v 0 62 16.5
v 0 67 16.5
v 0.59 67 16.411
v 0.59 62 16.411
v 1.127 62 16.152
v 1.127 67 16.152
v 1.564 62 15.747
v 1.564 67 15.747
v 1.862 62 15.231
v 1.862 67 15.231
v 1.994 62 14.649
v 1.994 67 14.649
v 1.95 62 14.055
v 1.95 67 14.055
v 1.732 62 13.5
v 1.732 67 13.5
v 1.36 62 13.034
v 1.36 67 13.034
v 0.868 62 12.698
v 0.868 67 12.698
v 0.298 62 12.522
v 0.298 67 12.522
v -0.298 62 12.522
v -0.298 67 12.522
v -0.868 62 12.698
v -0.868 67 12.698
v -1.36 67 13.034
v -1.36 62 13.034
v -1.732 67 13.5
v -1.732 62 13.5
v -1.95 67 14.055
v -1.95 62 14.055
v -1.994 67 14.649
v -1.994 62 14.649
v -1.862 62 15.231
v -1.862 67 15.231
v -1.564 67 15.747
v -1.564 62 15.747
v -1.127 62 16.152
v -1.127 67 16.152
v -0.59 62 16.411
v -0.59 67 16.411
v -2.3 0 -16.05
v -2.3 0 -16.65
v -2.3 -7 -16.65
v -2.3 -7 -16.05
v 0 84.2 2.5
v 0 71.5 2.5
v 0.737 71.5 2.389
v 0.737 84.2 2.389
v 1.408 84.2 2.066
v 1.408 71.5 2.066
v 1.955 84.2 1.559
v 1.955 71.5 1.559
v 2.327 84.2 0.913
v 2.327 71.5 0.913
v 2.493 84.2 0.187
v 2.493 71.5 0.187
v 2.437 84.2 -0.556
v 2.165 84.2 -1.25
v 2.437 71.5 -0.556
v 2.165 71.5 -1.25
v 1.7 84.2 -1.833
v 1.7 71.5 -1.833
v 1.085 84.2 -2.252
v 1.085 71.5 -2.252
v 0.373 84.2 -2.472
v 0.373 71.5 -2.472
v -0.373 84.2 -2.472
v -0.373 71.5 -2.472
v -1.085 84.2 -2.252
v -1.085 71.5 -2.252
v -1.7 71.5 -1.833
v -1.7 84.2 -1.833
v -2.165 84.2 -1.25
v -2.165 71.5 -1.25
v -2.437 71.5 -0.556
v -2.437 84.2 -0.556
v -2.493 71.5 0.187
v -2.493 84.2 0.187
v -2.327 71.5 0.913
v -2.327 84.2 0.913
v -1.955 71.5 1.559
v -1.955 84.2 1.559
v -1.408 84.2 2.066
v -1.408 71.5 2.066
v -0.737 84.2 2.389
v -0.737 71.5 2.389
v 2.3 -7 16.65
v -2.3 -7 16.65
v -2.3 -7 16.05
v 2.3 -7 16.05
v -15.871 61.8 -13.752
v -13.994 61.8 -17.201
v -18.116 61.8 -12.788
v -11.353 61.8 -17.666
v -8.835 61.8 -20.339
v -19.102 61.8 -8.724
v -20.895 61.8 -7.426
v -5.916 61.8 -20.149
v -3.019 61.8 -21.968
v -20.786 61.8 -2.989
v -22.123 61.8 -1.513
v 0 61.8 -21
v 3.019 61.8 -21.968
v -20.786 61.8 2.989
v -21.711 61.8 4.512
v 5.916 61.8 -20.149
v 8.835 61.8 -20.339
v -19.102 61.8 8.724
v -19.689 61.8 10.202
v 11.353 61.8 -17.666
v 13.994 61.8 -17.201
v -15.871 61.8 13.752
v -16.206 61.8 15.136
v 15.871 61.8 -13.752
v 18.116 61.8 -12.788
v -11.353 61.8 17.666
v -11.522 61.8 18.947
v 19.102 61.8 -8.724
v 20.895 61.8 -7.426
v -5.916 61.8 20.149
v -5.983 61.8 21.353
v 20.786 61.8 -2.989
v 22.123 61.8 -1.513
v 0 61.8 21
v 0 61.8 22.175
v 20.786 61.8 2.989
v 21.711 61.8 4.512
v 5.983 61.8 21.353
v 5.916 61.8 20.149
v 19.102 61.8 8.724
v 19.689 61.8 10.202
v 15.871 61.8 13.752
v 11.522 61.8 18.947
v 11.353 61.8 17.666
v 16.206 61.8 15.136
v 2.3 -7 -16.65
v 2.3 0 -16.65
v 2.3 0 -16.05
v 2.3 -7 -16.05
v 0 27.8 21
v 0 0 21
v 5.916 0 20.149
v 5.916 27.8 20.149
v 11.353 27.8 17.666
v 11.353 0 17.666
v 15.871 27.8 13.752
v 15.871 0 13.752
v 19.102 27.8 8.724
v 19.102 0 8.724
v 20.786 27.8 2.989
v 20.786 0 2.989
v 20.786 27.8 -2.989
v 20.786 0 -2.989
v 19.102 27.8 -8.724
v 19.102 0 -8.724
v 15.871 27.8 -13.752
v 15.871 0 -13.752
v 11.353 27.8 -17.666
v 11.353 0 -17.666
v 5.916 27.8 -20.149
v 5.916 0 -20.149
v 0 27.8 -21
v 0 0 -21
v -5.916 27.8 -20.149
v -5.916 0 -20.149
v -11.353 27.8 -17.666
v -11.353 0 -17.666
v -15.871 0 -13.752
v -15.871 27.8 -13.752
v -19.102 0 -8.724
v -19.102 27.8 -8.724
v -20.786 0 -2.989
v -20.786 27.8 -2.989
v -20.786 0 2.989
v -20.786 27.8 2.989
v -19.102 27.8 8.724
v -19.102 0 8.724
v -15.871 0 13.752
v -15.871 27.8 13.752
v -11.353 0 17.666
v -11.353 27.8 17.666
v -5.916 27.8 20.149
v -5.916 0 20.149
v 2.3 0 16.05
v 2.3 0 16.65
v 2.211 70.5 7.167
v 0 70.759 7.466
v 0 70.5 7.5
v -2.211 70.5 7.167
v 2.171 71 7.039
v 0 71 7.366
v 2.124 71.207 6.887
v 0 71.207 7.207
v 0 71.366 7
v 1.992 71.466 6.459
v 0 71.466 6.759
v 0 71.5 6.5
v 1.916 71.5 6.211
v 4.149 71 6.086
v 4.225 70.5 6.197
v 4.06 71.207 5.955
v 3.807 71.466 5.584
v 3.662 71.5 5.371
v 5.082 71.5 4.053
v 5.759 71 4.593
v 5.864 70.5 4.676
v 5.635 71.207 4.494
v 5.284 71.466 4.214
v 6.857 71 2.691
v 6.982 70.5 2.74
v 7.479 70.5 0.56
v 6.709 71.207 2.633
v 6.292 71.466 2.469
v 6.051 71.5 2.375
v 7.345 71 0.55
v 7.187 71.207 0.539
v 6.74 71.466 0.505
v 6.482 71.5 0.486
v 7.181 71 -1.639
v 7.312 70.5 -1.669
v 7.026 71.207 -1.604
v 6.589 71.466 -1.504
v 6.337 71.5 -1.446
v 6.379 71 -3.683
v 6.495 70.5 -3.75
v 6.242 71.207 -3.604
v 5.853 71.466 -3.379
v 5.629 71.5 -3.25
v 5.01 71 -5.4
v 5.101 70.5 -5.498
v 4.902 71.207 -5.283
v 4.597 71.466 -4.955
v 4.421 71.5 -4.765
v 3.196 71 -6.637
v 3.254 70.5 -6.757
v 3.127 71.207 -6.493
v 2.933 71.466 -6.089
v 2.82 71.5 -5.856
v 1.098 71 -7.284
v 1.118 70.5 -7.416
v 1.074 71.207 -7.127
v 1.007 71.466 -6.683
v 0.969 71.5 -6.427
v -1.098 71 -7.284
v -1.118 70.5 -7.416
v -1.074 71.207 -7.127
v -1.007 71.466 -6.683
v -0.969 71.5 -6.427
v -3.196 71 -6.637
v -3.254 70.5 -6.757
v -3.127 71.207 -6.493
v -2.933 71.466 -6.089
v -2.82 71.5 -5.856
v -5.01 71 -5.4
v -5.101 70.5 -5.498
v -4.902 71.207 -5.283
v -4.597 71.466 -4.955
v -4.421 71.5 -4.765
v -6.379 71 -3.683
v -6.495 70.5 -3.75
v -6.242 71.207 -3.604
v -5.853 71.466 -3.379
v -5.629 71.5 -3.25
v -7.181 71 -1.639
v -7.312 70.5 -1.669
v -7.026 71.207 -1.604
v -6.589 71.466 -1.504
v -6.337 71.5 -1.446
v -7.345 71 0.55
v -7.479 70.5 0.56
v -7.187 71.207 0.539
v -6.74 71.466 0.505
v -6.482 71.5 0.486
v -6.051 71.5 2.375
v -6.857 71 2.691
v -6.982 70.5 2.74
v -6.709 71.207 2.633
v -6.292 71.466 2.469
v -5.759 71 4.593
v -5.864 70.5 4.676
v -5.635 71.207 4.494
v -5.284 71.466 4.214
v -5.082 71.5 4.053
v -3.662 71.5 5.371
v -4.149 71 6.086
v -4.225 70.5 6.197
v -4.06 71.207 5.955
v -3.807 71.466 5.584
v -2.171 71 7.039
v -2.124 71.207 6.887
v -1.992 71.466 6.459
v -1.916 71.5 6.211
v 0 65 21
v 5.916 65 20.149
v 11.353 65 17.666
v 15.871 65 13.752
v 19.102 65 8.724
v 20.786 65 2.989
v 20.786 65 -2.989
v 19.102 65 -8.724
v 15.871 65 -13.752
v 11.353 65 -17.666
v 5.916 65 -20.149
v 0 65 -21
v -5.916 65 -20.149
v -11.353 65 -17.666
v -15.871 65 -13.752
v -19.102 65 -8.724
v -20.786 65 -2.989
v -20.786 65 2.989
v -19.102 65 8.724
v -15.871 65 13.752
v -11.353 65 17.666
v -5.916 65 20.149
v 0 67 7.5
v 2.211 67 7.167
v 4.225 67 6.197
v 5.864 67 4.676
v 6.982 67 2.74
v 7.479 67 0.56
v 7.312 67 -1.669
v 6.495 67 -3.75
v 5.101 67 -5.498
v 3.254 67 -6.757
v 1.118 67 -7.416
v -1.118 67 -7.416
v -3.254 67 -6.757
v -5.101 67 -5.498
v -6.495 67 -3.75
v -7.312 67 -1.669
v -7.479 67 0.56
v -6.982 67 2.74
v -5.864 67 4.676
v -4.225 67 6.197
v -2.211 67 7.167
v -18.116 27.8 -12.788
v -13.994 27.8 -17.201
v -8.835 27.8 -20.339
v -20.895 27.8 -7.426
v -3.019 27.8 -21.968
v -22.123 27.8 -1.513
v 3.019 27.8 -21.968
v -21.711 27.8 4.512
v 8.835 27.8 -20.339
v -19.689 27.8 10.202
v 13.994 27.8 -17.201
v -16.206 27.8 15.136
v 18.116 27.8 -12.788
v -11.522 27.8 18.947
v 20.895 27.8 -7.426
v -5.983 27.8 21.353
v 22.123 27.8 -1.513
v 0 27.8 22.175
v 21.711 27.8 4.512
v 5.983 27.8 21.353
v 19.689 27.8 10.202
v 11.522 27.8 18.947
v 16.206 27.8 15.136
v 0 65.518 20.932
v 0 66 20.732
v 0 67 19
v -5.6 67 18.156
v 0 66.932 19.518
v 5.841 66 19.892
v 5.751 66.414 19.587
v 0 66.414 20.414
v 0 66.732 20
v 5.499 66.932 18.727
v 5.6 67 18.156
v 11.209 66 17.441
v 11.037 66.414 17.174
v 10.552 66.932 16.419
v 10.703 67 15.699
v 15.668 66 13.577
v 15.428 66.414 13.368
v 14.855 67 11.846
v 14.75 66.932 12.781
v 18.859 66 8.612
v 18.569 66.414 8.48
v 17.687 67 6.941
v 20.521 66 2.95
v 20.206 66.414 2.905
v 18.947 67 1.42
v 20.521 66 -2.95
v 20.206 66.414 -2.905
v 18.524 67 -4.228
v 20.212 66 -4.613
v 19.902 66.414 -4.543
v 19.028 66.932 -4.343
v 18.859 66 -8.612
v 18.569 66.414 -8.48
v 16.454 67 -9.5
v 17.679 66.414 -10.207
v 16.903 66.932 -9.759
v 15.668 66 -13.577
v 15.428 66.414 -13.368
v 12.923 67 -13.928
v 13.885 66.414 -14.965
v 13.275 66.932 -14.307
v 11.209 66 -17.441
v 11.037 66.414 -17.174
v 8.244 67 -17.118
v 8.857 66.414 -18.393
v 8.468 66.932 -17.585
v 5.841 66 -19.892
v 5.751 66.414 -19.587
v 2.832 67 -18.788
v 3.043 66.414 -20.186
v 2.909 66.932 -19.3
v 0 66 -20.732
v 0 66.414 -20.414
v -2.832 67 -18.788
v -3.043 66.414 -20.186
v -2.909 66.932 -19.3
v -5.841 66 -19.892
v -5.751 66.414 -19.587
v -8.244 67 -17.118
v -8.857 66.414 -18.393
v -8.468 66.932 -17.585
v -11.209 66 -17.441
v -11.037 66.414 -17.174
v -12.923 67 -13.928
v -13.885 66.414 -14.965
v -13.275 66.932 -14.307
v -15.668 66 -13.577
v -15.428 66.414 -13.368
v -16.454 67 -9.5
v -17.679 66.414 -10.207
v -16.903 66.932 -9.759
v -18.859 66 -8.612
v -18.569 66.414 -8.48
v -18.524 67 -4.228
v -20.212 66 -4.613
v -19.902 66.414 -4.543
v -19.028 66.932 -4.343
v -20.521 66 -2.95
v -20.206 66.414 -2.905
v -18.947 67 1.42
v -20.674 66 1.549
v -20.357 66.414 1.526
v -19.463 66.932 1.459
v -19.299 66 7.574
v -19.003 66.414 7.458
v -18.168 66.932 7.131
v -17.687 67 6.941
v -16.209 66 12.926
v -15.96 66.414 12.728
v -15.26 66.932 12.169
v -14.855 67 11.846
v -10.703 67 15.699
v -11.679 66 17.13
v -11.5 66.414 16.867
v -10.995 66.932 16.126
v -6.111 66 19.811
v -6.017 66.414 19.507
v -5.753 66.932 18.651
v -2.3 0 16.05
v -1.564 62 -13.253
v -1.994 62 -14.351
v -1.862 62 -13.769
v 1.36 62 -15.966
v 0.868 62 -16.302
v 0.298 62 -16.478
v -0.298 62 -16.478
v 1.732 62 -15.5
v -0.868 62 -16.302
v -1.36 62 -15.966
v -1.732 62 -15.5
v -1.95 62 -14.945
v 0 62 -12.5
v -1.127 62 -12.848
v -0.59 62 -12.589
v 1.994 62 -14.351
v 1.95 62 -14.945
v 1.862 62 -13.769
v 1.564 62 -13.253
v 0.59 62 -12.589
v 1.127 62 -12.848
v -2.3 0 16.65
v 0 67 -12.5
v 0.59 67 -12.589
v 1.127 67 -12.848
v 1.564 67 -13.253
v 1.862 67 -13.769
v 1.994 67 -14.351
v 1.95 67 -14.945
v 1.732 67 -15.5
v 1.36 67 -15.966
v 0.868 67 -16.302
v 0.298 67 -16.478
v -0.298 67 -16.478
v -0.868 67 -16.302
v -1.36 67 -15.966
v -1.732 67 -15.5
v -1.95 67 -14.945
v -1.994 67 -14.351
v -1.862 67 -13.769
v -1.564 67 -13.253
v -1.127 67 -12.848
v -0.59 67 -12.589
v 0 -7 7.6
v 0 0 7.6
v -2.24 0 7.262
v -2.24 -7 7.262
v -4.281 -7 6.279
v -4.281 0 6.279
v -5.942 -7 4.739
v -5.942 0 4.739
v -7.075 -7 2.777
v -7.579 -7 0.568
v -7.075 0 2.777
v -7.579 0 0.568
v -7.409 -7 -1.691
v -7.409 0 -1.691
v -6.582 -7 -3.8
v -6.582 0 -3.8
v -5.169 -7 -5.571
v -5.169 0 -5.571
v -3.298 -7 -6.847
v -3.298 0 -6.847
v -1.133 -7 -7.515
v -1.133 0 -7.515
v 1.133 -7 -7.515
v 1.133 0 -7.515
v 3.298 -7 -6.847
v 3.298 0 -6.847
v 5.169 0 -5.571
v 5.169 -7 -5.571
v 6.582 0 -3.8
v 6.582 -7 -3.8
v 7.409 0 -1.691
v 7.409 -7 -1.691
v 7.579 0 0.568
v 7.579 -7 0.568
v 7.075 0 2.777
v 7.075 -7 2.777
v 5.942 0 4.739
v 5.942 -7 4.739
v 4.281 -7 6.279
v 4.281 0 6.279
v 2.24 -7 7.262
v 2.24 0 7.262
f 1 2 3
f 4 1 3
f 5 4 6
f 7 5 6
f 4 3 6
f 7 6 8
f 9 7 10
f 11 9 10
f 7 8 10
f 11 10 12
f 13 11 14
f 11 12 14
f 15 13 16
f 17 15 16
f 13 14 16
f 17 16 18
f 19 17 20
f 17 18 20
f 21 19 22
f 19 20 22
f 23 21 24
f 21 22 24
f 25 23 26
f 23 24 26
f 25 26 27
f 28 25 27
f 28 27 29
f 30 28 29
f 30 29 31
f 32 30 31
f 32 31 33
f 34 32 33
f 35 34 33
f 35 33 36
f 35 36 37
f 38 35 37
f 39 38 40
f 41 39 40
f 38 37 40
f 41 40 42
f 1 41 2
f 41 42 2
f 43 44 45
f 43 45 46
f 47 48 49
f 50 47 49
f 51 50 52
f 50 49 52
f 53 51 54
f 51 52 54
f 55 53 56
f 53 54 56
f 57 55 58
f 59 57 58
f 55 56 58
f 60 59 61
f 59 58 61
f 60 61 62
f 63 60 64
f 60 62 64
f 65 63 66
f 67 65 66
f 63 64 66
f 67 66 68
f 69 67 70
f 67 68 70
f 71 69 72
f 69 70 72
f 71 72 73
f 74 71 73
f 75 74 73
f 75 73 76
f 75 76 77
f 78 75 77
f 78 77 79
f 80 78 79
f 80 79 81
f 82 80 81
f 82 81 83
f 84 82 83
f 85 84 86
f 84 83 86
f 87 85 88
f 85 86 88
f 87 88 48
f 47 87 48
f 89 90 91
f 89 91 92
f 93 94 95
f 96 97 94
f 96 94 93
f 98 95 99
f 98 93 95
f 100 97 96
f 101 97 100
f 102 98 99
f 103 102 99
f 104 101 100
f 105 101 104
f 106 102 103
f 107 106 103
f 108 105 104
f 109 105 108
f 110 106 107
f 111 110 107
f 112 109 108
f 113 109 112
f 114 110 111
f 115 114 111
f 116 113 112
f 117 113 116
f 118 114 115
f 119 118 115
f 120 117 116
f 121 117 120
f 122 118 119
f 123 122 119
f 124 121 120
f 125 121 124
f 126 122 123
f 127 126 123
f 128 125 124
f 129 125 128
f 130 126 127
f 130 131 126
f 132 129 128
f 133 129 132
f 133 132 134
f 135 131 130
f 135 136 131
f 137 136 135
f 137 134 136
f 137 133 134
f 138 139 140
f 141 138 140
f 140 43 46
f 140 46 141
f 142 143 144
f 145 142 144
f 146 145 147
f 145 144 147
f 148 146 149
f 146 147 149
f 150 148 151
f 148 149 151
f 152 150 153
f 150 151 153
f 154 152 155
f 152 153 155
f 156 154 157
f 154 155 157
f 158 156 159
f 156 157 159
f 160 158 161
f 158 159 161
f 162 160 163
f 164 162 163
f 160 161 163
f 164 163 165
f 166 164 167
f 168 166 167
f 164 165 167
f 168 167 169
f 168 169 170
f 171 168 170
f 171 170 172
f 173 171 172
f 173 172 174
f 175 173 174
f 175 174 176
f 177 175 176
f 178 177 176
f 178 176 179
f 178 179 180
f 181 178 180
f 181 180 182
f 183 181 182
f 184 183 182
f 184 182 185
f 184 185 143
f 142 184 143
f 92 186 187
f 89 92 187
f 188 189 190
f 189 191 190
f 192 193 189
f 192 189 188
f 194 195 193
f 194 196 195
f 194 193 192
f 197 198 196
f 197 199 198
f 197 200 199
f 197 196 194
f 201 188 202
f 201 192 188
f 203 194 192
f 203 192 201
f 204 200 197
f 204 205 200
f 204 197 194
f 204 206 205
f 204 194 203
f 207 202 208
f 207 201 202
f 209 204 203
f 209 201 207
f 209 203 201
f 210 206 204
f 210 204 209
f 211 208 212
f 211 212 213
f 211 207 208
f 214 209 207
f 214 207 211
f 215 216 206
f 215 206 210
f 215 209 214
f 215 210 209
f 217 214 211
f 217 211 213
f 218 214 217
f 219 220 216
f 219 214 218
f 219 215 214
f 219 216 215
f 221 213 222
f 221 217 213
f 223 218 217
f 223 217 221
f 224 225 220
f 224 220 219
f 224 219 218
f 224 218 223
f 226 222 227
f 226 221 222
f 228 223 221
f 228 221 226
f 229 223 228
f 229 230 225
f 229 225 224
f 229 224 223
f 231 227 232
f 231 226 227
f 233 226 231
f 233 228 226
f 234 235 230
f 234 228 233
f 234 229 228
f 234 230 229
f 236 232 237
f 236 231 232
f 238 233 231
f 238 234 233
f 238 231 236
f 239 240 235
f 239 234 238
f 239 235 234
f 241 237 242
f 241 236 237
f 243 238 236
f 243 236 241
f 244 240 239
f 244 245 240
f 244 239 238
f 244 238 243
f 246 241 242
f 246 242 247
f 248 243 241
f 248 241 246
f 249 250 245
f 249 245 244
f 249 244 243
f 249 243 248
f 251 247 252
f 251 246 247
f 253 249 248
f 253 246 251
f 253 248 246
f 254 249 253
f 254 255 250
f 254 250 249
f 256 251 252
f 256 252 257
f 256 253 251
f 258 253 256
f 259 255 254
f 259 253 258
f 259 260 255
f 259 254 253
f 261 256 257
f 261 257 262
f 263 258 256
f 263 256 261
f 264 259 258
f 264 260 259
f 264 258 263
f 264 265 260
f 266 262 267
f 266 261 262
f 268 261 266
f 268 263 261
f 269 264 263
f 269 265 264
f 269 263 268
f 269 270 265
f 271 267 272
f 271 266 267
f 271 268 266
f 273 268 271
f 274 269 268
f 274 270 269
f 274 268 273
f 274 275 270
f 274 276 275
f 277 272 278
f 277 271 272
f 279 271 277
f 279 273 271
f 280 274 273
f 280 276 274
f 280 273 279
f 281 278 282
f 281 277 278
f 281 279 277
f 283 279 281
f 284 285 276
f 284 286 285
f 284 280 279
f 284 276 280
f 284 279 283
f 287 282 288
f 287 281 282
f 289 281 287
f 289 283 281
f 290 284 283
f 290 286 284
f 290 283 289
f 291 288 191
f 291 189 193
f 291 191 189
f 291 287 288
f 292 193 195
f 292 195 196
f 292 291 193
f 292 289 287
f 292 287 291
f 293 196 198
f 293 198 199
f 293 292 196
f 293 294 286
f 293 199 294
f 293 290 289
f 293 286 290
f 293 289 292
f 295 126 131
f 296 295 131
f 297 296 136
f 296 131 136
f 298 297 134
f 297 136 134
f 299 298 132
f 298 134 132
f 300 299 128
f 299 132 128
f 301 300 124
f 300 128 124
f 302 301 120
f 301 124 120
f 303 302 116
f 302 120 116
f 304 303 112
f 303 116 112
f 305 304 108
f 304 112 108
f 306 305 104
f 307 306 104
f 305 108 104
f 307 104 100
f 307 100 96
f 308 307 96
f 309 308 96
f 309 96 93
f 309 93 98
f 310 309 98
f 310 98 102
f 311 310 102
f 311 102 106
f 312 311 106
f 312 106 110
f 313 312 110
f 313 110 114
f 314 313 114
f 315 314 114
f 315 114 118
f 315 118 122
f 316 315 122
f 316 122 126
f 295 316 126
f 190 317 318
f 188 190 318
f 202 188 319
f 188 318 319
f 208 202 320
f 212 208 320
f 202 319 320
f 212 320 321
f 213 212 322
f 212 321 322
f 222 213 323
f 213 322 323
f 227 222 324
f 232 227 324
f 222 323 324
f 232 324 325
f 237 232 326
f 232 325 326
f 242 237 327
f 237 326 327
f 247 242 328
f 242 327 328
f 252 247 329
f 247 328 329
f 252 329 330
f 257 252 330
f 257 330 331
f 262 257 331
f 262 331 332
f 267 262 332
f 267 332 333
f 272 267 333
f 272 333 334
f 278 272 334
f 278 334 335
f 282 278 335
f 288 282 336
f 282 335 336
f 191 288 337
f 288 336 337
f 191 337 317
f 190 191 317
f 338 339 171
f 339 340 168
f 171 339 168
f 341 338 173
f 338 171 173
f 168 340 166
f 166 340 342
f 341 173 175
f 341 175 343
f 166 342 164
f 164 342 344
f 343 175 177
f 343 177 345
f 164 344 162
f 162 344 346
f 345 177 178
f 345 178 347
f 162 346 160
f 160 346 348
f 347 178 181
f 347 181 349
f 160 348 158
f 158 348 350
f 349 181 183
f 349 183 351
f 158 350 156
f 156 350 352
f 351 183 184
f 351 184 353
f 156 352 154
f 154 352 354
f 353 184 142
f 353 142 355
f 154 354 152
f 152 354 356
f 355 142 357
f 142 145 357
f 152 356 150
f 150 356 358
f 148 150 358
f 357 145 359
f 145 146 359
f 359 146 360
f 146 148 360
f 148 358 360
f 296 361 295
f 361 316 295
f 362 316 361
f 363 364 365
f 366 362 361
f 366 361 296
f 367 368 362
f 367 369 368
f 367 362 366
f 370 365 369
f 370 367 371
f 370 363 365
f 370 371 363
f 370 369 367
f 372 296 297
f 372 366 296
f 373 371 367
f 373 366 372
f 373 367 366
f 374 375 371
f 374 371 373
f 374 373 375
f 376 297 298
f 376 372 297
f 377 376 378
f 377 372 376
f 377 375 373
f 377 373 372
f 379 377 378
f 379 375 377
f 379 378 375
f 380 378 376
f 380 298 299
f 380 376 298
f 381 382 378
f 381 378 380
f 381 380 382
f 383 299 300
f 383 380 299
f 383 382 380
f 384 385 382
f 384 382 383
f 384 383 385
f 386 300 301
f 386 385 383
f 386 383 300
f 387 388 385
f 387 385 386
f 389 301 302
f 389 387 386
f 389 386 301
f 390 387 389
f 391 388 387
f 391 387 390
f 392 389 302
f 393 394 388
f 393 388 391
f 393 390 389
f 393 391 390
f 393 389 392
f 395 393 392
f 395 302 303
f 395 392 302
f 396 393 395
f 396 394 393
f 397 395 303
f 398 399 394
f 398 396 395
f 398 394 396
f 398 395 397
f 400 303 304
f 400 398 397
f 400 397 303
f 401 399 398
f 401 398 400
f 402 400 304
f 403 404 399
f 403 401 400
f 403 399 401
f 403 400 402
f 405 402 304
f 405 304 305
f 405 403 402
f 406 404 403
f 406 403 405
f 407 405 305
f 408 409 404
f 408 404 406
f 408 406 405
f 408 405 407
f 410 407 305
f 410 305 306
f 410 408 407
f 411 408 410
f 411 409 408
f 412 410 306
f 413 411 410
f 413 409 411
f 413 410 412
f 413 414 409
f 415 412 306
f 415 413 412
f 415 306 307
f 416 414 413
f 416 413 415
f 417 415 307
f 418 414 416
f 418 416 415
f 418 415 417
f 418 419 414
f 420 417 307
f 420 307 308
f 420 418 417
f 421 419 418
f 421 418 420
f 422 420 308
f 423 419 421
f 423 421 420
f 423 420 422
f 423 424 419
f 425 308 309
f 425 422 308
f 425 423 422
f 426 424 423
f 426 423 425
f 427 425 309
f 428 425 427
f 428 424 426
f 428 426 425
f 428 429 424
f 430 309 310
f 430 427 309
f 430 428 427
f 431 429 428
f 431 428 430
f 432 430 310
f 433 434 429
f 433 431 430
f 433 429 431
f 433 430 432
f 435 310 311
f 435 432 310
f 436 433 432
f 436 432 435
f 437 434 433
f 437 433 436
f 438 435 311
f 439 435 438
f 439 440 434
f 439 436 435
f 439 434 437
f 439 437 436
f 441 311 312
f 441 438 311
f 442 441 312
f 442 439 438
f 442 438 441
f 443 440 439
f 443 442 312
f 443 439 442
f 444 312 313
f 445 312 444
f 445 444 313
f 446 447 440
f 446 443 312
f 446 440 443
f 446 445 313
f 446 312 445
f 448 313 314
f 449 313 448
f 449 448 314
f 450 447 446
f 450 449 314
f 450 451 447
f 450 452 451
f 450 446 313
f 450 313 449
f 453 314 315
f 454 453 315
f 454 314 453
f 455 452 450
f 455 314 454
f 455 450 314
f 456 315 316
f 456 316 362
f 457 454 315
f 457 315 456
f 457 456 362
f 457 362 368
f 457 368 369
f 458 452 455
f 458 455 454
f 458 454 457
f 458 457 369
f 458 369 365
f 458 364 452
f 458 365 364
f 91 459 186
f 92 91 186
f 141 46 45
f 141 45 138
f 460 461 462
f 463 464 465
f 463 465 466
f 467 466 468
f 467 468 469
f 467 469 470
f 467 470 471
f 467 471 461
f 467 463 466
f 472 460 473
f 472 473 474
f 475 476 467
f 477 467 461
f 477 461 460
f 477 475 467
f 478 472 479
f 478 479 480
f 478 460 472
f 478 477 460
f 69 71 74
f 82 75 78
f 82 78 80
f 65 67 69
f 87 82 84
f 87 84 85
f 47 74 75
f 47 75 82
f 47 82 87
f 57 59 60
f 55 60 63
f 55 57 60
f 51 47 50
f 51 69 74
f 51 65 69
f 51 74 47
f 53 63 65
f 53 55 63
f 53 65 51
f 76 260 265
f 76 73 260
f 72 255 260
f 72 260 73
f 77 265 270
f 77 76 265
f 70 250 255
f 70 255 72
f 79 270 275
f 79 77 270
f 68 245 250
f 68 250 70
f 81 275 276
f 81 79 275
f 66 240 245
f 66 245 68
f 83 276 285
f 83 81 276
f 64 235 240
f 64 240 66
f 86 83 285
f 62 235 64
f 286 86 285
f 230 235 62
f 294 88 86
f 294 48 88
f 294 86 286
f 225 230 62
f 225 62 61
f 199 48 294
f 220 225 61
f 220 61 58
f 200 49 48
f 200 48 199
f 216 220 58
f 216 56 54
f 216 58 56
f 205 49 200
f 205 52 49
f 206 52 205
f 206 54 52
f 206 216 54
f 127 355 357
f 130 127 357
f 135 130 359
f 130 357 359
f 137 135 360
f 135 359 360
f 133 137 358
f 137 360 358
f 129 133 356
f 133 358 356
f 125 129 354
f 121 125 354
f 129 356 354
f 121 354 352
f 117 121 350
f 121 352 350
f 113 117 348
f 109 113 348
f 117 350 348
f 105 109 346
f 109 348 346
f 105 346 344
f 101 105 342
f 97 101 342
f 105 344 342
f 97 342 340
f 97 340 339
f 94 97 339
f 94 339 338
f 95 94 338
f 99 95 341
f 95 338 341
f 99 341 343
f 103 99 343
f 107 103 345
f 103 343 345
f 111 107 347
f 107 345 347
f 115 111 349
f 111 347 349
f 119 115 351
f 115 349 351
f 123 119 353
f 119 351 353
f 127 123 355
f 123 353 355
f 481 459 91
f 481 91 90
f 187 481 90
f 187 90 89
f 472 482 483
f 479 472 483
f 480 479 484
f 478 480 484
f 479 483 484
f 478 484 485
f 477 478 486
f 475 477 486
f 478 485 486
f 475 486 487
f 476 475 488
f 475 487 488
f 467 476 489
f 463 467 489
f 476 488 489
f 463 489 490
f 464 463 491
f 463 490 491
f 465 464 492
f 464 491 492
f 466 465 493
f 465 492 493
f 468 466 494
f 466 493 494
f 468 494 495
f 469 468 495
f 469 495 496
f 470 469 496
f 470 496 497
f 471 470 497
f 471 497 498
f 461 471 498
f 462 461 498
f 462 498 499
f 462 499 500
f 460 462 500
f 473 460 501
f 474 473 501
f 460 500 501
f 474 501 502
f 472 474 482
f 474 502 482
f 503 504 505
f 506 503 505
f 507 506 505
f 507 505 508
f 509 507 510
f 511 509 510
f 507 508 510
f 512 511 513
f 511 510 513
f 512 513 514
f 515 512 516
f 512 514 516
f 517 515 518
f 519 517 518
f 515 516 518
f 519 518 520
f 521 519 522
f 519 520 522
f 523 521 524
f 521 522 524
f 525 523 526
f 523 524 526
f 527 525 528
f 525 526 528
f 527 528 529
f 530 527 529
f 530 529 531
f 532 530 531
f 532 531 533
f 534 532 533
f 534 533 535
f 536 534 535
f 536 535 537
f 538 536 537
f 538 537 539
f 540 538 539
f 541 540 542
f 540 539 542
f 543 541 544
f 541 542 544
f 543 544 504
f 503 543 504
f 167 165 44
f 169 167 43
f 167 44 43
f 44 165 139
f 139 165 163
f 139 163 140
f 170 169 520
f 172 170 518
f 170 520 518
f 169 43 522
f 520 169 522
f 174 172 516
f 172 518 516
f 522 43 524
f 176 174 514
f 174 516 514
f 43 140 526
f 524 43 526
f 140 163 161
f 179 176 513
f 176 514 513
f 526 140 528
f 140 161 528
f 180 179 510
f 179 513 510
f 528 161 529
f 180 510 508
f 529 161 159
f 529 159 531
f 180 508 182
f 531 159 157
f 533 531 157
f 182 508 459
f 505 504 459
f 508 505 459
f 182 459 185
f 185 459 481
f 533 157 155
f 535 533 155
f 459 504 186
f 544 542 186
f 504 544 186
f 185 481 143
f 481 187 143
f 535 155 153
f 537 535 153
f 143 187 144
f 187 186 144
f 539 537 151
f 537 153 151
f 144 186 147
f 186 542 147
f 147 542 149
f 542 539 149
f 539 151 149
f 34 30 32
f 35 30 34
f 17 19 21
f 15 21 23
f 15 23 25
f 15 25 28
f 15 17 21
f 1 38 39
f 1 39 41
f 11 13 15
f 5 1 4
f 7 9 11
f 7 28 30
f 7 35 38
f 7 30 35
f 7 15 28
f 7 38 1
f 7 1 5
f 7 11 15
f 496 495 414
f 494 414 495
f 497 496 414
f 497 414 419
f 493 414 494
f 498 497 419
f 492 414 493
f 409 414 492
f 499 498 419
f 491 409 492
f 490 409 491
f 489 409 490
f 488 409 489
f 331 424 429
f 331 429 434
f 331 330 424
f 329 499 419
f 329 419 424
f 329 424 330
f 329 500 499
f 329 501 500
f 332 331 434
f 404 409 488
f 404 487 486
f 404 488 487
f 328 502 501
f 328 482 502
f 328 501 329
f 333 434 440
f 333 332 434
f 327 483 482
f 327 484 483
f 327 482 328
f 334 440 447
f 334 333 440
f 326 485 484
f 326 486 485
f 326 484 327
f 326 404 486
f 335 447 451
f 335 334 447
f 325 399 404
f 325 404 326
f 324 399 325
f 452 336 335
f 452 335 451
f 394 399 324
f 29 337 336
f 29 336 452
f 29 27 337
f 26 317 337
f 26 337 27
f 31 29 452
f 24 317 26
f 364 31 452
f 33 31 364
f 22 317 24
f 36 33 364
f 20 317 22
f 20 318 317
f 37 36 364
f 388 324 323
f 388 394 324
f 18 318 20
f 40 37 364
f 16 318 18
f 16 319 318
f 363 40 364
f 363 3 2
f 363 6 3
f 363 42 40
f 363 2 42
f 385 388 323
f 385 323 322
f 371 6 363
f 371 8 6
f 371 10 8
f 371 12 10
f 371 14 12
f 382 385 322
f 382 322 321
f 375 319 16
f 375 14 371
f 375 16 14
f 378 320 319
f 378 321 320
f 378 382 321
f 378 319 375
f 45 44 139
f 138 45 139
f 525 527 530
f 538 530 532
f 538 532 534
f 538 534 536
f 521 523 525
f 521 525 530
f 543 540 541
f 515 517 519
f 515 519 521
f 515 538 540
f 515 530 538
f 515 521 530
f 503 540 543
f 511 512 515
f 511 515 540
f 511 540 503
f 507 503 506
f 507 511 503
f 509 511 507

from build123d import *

# Parameters (mm, degrees)
SKETCH_1_R          = 21
EXTRUDE_1_DEPTH     = 67
SKETCH_3_R          = 7.5
EXTRUDE_3_DEPTH     = 4.5
SKETCH_4_R          = 2.5
EXTRUDE_4_DEPTH     = 12.7
FILLET_1_R          = 2
FILLET_2_R          = 1
SKETCH_15_R         = 2
CUT_EXTRUDE_2_DEPTH = 5
SKETCH_18_W         = 4.6
SKETCH_18_H         = 0.6
EXTRUDE_11_DEPTH    = 7
SKETCH_19_R         = 7.6
EXTRUDE_12_DEPTH    = 7
EXTRUDE_START       = -39.2
SKETCH_20_R         = 22.175
SKETCH_20_R_2       = 21
EXTRUDE_13_DEPTH    = 34


with BuildPart() as part:
    # 스케치1 → 보스-돌출1 (new body)
    with BuildSketch(Plane(origin=(0, 0, 0), x_dir=(1, 0, 0), z_dir=(0, 1, 0))):
        with Locations(Location((0, 0, 0), (0, 0, 270))):
            Circle(SKETCH_1_R)
    extrude(amount=EXTRUDE_1_DEPTH)

    # 스케치3 → 보스-돌출3 (add)
    with BuildSketch(Plane(origin=(0, 67, 0), x_dir=(1, 0, 0), z_dir=(0, 1, 0))):
        with Locations(Location((0, 0, 0), (0, 0, 270))):
            Circle(SKETCH_3_R)
    extrude(amount=EXTRUDE_3_DEPTH)

    # 스케치4 → 보스-돌출4 (add)
    with BuildSketch(Plane(origin=(0, 71.5, 0), x_dir=(1, 0, 0), z_dir=(0, 1, 0))):
        with Locations(Location((0, 0, 0), (0, 0, 270))):
            Circle(SKETCH_4_R)
    extrude(amount=EXTRUDE_4_DEPTH)

    # 필렛1
    fillet_1_edges = [part.edges().sort_by_distance(p)[0] for p in [
        (0, 67, -21),
    ]]
    fillet(fillet_1_edges, radius=FILLET_1_R)

    # 필렛2
    fillet_2_edges = [part.edges().sort_by_distance(p)[0] for p in [
        (0, 71.5, -7.5),
    ]]
    fillet(fillet_2_edges, radius=FILLET_2_R)

    # 스케치15 → 컷-돌출2 (cut)
    with BuildSketch(Plane(origin=(0, 67, 0), x_dir=(1, 0, 0), z_dir=(0, 1, 0))):
        with Locations(Location((0, 14.5, 0), (0, 0, 270))):
            Circle(SKETCH_15_R)
        with Locations(Location((0, -14.5, 0), (0, 0, 270))):
            Circle(SKETCH_15_R)
    extrude(amount=-CUT_EXTRUDE_2_DEPTH, mode=Mode.SUBTRACT)

    # 스케치18 → 보스-돌출11 (add)
    with BuildSketch(Plane.XZ):
        with Locations((0, 16.35)):
            Rectangle(SKETCH_18_W, SKETCH_18_H)
        with Locations((0, -16.35)):
            Rectangle(SKETCH_18_W, SKETCH_18_H)
    extrude(amount=EXTRUDE_11_DEPTH)

    # 스케치19 → 보스-돌출12 (add)
    with BuildSketch(Plane.XZ):
        with Locations(Location((0, 0, 0), (0, 0, 90))):
            Circle(SKETCH_19_R)
    extrude(amount=EXTRUDE_12_DEPTH)

    # 스케치20 → 보스-돌출13 (add)
    with BuildSketch(Plane(origin=(0, 67, 0), x_dir=(1, 0, 0), z_dir=(0, 1, 0)).offset(EXTRUDE_START)):
        with Locations(Location((0, 0, 0), (0, 0, 270))):
            Circle(SKETCH_20_R)
        with Locations(Location((0, 0, 0), (0, 0, 270))):
            Circle(SKETCH_20_R_2, mode=Mode.SUBTRACT)
    extrude(amount=EXTRUDE_13_DEPTH)


solid = part.part
